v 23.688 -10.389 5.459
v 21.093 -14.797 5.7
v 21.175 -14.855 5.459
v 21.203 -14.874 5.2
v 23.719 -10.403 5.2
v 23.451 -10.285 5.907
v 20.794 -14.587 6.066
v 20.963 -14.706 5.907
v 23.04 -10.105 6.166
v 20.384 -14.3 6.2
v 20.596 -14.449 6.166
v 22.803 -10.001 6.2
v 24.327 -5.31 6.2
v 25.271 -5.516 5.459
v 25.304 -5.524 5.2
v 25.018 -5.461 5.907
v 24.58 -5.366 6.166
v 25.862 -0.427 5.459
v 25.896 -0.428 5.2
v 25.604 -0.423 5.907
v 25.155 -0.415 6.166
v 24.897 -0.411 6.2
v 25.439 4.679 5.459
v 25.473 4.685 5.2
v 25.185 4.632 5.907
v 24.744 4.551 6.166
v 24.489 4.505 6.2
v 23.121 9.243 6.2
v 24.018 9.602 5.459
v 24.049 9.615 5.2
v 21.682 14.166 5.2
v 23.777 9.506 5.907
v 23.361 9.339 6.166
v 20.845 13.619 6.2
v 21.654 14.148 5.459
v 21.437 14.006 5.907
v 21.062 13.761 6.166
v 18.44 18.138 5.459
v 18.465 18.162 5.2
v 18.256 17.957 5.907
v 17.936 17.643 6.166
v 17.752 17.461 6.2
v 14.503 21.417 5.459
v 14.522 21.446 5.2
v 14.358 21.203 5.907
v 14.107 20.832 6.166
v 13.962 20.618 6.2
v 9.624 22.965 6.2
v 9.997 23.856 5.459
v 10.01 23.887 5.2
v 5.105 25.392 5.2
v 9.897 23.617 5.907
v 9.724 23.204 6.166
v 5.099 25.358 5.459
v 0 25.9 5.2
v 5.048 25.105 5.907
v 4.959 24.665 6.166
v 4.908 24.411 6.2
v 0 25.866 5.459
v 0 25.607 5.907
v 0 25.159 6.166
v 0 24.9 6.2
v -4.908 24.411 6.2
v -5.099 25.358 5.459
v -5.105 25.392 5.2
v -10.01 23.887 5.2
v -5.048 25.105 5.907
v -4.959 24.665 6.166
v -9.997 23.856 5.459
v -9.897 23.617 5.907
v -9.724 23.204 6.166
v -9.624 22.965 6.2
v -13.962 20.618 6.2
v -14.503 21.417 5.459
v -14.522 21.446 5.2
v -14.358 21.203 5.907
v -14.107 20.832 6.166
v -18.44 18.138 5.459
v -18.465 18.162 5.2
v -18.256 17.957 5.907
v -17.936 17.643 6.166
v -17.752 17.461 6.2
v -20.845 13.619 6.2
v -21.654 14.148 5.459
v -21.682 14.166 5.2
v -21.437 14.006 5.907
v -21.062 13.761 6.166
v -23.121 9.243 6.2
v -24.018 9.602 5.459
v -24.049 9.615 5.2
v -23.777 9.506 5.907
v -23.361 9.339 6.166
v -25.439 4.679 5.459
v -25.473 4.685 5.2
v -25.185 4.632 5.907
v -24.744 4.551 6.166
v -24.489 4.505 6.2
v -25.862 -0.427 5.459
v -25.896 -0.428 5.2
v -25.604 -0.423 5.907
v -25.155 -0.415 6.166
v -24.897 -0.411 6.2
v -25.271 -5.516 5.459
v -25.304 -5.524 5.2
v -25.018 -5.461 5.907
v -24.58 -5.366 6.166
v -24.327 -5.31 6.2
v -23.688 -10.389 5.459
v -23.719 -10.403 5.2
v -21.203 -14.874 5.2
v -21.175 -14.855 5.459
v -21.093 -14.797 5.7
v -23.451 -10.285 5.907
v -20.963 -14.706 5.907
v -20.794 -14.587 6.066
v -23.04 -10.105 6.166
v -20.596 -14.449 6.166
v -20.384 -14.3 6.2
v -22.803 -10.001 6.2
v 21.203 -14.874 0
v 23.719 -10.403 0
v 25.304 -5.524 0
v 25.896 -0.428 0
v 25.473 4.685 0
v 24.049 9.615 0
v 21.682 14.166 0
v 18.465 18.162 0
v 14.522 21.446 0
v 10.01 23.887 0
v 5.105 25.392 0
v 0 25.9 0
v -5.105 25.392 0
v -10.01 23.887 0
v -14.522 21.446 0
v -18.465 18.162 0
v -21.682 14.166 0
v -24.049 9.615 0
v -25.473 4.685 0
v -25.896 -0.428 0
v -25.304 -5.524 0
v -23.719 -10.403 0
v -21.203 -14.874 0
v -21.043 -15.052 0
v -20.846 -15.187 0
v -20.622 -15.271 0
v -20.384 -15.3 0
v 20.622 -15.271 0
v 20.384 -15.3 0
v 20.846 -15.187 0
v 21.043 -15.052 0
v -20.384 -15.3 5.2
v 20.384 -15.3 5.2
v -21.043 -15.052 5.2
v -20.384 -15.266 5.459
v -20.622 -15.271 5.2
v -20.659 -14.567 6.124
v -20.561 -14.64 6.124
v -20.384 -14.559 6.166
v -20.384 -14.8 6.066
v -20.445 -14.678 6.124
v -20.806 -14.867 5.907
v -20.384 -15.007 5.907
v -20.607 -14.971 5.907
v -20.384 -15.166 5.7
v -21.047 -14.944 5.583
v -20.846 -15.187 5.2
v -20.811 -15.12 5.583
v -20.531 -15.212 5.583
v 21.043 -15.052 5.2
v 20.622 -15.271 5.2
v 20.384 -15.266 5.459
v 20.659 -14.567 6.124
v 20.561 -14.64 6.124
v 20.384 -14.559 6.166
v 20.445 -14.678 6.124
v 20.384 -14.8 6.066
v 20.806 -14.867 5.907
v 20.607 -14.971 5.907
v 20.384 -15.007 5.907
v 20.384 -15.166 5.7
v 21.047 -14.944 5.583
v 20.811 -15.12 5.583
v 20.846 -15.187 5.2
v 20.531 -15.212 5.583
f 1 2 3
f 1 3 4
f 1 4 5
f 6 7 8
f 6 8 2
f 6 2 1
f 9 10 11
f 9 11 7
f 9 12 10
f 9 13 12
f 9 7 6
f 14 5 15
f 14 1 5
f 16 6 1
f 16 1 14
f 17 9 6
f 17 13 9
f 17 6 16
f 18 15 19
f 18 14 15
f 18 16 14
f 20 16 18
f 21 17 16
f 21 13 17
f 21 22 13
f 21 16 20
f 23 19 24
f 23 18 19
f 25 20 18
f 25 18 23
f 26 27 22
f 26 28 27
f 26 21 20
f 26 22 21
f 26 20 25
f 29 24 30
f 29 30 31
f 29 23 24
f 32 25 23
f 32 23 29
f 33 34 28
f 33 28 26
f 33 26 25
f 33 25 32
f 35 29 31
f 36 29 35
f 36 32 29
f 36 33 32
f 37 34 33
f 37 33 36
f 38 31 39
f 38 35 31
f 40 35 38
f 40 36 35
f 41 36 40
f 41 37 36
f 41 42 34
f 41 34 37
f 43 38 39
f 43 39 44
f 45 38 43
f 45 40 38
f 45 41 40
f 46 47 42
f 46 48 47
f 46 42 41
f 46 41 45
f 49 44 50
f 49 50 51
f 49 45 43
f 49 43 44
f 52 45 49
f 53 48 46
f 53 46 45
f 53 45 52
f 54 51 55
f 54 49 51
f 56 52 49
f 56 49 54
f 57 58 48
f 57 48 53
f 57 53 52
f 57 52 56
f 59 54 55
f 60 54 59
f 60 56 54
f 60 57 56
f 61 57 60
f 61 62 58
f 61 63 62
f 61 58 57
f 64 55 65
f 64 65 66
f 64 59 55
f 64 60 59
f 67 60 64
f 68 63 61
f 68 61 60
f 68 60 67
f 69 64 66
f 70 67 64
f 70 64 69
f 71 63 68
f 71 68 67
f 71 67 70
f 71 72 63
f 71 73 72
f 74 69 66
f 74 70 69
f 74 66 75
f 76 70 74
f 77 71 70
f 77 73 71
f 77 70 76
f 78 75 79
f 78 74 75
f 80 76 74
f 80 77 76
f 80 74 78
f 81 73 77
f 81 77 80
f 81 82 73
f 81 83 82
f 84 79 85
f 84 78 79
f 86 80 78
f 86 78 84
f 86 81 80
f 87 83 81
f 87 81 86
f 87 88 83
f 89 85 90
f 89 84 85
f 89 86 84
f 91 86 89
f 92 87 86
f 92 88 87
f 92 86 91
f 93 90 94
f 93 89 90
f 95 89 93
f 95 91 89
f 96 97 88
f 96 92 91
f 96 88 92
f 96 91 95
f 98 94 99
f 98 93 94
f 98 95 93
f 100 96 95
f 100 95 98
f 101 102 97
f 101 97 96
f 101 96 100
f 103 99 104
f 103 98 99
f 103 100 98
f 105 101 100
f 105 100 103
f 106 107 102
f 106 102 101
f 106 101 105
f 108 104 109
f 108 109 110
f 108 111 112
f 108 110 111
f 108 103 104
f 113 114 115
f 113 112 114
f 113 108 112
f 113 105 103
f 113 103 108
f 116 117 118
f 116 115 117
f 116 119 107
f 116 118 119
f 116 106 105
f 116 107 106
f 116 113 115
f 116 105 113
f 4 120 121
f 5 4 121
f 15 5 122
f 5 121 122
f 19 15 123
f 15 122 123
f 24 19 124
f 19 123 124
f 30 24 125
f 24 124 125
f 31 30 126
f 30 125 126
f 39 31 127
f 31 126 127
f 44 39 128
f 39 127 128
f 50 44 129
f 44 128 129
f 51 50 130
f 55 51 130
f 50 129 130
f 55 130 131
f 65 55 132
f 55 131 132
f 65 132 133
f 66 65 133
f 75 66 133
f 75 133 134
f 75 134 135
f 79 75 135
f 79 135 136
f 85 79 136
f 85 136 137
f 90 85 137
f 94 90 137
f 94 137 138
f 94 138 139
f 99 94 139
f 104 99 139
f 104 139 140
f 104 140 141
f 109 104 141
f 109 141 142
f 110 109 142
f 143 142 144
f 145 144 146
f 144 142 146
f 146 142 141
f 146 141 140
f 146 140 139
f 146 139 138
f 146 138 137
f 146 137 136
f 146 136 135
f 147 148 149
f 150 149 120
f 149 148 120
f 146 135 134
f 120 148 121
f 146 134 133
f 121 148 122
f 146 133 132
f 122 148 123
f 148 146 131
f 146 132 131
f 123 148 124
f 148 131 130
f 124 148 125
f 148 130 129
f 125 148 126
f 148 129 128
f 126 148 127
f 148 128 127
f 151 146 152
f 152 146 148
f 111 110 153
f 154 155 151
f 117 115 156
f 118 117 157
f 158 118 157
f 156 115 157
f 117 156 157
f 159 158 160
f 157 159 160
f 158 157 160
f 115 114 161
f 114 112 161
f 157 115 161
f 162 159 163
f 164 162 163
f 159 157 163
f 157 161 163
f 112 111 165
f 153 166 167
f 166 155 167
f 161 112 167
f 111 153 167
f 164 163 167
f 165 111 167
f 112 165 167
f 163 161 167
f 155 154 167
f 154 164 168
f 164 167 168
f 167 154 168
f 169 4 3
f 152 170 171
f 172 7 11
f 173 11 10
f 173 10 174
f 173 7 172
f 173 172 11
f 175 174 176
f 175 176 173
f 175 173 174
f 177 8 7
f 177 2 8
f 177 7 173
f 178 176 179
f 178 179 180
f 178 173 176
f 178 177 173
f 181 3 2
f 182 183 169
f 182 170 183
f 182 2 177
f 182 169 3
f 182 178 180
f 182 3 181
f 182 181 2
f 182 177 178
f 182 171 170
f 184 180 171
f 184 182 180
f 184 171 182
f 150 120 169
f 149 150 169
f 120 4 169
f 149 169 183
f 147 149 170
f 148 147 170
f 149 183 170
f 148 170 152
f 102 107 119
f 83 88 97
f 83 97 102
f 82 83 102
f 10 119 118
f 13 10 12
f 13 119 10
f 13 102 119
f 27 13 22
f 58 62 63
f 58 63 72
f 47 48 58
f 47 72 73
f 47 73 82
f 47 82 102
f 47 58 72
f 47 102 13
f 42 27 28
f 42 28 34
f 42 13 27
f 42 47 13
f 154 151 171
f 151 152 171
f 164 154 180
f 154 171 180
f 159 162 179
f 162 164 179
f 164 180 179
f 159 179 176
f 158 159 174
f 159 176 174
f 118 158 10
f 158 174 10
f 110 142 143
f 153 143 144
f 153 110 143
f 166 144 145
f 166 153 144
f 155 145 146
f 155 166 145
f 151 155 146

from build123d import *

# Parameters (mm, degrees)
F1_DEPTH = 6.2
F2_R     = 1


with BuildPart() as f1:
    # F0 (on Top) → F1 (new body)
    with BuildSketch(Plane.XY):
        with BuildLine():
            ThreePointArc((20.897846779, -15.3), (0, 25.9), (-20.897846779, -15.3))
            Line((-20.897846779, -15.3), (20.897846779, -15.3))
        make_face()
    extrude(amount=F1_DEPTH)

    # F2
    f2_edges = [f1.edges().sort_by_distance(p)[0] for p in [
        (-20.897847, -15.3, 3.1),
        (0, 25.9, 6.2),
        (0, -15.3, 6.2),
        (20.897847, -15.3, 3.1),
    ]]
    fillet(f2_edges, radius=F2_R)


solid = f1.part
